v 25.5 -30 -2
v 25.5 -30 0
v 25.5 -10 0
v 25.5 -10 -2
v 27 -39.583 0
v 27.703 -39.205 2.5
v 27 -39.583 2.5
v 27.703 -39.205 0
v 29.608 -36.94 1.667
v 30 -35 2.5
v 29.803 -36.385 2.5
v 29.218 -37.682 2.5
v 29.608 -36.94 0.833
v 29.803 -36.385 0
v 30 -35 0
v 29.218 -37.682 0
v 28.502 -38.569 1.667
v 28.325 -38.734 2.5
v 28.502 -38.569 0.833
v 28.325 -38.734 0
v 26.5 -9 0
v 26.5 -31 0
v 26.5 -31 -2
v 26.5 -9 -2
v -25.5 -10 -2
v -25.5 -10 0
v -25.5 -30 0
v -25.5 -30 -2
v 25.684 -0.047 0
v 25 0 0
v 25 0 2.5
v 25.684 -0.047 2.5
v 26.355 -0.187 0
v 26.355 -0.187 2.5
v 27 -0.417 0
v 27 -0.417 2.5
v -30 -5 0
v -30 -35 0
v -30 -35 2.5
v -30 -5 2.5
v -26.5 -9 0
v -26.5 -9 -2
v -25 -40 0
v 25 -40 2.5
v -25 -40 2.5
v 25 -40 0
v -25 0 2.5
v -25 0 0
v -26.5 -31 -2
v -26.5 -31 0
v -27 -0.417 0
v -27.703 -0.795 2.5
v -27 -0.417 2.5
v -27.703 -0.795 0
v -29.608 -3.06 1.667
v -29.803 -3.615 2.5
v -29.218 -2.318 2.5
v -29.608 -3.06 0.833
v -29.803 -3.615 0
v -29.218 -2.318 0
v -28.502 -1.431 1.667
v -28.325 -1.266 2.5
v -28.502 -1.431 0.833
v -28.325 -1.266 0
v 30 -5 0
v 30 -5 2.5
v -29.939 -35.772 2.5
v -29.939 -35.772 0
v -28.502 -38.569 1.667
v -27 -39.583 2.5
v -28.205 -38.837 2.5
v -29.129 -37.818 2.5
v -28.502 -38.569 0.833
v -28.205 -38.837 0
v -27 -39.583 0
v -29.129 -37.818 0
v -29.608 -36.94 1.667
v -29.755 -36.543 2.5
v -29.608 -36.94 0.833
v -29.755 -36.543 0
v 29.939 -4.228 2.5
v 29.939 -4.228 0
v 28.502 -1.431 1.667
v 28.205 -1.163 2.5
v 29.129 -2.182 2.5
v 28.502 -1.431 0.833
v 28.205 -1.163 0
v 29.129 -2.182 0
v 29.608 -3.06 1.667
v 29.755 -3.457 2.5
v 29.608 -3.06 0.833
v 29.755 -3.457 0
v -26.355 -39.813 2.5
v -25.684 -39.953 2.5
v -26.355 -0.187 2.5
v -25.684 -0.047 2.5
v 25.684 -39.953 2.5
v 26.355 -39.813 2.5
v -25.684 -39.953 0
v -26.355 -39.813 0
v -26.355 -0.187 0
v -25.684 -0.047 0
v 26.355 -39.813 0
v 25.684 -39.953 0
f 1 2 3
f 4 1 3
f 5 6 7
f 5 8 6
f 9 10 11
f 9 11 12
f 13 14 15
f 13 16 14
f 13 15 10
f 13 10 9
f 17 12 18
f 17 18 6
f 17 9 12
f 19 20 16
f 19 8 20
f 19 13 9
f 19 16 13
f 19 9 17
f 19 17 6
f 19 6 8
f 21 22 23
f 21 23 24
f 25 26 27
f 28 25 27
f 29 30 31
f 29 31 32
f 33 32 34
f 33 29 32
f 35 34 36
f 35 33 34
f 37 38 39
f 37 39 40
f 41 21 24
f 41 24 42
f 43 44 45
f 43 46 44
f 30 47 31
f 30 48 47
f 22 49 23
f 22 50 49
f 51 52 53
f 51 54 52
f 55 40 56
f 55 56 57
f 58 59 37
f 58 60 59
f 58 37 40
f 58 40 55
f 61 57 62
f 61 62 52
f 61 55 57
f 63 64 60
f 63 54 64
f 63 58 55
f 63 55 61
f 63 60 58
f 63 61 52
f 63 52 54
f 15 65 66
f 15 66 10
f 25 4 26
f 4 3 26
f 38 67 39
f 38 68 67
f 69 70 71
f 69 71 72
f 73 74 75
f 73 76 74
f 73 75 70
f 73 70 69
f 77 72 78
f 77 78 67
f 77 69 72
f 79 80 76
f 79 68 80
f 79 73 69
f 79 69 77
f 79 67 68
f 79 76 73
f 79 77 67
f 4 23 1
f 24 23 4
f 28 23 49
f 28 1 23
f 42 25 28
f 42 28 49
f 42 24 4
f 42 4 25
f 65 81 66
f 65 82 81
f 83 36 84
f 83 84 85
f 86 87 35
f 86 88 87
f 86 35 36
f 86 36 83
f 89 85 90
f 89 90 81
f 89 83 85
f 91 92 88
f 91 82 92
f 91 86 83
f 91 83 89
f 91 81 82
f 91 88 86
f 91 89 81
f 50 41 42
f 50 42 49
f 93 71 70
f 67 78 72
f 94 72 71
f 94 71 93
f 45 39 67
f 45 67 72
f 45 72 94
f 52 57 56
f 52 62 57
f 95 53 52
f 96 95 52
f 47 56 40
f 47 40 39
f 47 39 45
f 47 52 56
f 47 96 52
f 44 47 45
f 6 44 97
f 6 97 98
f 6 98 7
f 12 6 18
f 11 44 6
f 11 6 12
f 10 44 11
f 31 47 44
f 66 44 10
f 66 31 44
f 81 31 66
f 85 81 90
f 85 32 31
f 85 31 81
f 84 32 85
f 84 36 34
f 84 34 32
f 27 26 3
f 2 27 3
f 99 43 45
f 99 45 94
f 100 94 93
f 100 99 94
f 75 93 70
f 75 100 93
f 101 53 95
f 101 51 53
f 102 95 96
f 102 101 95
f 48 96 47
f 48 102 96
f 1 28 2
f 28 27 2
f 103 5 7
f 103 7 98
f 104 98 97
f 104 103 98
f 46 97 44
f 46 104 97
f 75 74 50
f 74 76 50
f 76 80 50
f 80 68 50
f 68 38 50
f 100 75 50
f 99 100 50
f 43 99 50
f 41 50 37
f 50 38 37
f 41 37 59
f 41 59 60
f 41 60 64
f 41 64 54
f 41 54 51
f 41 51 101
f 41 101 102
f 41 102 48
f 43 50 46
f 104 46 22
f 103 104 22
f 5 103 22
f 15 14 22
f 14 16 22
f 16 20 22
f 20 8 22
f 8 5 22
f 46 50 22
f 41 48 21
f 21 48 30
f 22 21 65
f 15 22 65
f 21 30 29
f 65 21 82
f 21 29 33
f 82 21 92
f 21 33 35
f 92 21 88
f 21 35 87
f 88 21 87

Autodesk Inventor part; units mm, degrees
ref_plane "YZ Plane" through (0, 0, 0) normal (1, 0, 0) x (0, 1, 0)
ref_plane "XZ Plane" through (0, 0, 0) normal (0, 1, 0) x (-1, 0, 0)
ref_plane "XY Plane" through (0, 0, 0) normal (0, 0, 1) x (1, 0, 0)
sketch "Sketch1" plane through (0, 0, 0) normal (0, 0, 1) x (1, 0, 0)
  spline S0 degree 3 poles (-30, -5) (-30, -4.3586) (-29.8694, -3.6802) (-29.3471, -2.4395) (-28.9555, -1.8763) (-28.0866, -1.0236) (-27.5672, -0.665) (-27, -0.4174) knots 1.621626 1.621626 1.621626 1.621626 1.814042 1.814042 2.006457 2.006457 2.182648 2.182648 2.182648 2.182648 projected
  line L0 (-25, 0) -> (25, 0) projected
  spline S1 degree 3 poles (27, -0.4174) (27.5672, -0.665) (28.0866, -1.0236) (28.9555, -1.8763) (29.3471, -2.4395) (29.8694, -3.6802) (30, -4.3586) (30, -5) knots -0.561022 -0.561022 -0.561022 -0.561022 -0.384831 -0.384831 -0.192415 -0.192415 0 0 0 0 projected
  line L1 (30, -5) -> (30, -35) projected
  spline S2 degree 3 poles (30, -35) (30, -35.6414) (29.8694, -36.3198) (29.3471, -37.5605) (28.9555, -38.1237) (28.0866, -38.9764) (27.5672, -39.335) (27, -39.5826) knots 0 0 0 0 0.192415 0.192415 0.384831 0.384831 0.561022 0.561022 0.561022 0.561022 projected
  line L2 (25, -40) -> (-25, -40) projected
  line L3 (-30, -35) -> (-30, -5) projected
  spline S3 degree 3 poles (-27, -39.5826) (-27.5672, -39.335) (-28.0866, -38.9764) (-28.9555, -38.1237) (-29.3471, -37.5605) (-29.8694, -36.3198) (-30, -35.6414) (-30, -35) knots 1.060605 1.060605 1.060605 1.060605 1.236796 1.236796 1.429211 1.429211 1.621626 1.621626 1.621626 1.621626 projected
  arc A0 (-25, 0) -> (-27, -0.4174) centre (-25, -5) ccw projected
  arc A1 (27, -0.4174) -> (25, 0) centre (25, -5) ccw projected
  arc A2 (25, -40) -> (27, -39.5826) centre (25, -35) ccw projected
  arc A3 (-27, -39.5826) -> (-25, -40) centre (-25, -35) ccw projected
  point P0 (0, 0)
  dimension "d8" = 60
  dimension "d9" = 40
extrude "Extrusion1" add sketch "Sketch1" along normal blind 2.5
sketch "Sketch2" plane through (0, 0, 0) normal (0, 0, -1) x (-1, 0, 0)
  line L0 (-25.5, -10) -> (25.5, -10)
  line L1 (25.5, -10) -> (25.5, -30)
  line L2 (25.5, -30) -> (-25.5, -30)
  line L3 (-25.5, -30) -> (-25.5, -10)
  line L4 (-25.5, -10) -> (25.5, -30) construction
  line L5 (25.5, -10) -> (-25.5, -30) construction
  line L6 (-26.5, -9) -> (26.5, -9)
  line L7 (26.5, -9) -> (26.5, -31)
  line L8 (26.5, -31) -> (-26.5, -31)
  line L9 (-26.5, -31) -> (-26.5, -9)
  line L10 (-26.5, -9) -> (26.5, -31) construction
  line L11 (26.5, -9) -> (-26.5, -31) construction
  point P0 (0, 0)
  point P1 (0, -20)
  point P2 (0, -20)
  dimension "d2" = 51
  dimension "d3" = 20
  dimension "d4" = 53
  dimension "d5" = 22
extrude "Extrusion2" add sketch "Sketch2" along normal blind 2
properties part number "obudowa - budzik v3 plexi" material "Glass"
